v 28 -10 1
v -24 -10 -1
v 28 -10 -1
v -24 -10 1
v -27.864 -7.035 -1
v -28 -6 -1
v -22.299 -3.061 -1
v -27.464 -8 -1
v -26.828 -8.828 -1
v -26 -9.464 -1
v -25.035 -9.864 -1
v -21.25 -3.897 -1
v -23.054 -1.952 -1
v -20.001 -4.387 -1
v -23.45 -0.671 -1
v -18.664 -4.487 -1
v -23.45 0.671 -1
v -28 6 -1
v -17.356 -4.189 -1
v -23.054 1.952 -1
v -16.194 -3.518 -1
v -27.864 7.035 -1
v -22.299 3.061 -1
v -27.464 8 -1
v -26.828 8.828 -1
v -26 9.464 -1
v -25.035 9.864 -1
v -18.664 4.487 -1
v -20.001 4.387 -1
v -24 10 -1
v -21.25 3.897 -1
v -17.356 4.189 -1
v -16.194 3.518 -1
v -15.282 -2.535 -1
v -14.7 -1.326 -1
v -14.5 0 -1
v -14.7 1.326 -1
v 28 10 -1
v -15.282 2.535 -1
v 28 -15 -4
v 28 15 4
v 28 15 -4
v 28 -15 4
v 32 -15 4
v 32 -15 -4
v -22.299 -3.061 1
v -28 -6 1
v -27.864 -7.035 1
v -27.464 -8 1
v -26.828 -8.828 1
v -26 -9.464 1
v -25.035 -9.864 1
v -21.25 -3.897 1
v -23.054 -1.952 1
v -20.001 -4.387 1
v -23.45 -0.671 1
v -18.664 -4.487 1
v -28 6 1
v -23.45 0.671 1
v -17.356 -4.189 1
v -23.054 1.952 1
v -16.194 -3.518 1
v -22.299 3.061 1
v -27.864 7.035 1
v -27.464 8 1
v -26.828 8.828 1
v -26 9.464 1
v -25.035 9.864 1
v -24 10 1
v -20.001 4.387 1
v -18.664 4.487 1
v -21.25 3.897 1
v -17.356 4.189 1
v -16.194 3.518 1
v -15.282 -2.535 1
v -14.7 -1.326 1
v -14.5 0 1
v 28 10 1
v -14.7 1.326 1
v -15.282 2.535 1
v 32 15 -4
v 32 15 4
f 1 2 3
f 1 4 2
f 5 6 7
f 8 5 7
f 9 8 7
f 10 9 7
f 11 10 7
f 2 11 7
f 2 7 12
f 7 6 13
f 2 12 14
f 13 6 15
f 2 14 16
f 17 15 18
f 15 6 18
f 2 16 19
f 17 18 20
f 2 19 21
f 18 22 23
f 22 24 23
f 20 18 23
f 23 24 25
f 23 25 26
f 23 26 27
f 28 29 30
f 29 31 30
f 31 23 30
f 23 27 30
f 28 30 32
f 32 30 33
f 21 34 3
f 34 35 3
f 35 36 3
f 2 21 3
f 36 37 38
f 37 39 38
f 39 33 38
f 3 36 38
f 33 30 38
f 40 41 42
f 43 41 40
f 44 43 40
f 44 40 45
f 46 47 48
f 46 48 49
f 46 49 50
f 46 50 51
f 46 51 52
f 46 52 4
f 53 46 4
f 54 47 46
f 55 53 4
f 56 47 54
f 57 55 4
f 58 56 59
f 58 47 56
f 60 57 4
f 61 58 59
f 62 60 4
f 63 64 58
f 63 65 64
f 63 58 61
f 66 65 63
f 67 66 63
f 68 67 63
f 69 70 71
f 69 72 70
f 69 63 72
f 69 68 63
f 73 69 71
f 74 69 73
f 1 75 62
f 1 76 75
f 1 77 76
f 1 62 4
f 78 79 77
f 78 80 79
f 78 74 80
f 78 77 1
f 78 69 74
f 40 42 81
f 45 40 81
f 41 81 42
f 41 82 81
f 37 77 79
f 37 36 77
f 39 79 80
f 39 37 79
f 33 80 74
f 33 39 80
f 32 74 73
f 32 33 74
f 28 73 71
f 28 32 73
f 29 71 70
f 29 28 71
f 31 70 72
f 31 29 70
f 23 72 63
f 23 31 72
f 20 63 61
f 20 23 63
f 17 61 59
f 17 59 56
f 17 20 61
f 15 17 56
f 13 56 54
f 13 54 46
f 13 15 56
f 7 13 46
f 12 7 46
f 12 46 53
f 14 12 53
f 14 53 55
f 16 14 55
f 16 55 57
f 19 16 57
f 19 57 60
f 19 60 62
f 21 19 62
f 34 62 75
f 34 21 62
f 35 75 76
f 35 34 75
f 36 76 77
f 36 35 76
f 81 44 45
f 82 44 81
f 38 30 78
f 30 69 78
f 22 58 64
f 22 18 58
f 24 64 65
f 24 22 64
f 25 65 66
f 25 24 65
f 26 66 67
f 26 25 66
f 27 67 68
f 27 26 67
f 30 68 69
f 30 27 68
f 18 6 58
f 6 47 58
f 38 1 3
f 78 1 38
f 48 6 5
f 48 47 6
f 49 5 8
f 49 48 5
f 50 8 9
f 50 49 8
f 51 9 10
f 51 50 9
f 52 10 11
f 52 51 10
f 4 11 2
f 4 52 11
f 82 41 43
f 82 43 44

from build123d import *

# Parameters (mm, degrees)
F1_DEPTH = 4
F0_W     = 56
F0_H     = 20
F0_R     = 4.5
F2_DEPTH = 1
F3_R     = 4
F4_R     = 4


with BuildPart() as f1:
    # F0 (on Top) → F1 (new body, symmetric)
    with BuildSketch(Plane.XY):
        Polygon((28, 15), (28, 10), (28, -10), (28, -15), (32, -15), (32, 15), align=None)
    extrude(amount=F1_DEPTH, both=True)


with BuildPart() as f2:
    # F0 (on Top) → F2 (new body, symmetric)
    with BuildSketch(Plane.XY):
        Rectangle(F0_W, F0_H)
        with Locations((-19, 0)):
            Circle(F0_R, mode=Mode.SUBTRACT)
    extrude(amount=F2_DEPTH, both=True)

    # F3
    f3_edges = [f2.edges().sort_by_distance(p)[0] for p in [
        (-28, -10, 0),
    ]]
    fillet(f3_edges, radius=F3_R)

    # F4
    f4_edges = [f2.edges().sort_by_distance(p)[0] for p in [
        (-28, 10, 0),
    ]]
    fillet(f4_edges, radius=F4_R)


solid = Compound([f1.part, f2.part])
